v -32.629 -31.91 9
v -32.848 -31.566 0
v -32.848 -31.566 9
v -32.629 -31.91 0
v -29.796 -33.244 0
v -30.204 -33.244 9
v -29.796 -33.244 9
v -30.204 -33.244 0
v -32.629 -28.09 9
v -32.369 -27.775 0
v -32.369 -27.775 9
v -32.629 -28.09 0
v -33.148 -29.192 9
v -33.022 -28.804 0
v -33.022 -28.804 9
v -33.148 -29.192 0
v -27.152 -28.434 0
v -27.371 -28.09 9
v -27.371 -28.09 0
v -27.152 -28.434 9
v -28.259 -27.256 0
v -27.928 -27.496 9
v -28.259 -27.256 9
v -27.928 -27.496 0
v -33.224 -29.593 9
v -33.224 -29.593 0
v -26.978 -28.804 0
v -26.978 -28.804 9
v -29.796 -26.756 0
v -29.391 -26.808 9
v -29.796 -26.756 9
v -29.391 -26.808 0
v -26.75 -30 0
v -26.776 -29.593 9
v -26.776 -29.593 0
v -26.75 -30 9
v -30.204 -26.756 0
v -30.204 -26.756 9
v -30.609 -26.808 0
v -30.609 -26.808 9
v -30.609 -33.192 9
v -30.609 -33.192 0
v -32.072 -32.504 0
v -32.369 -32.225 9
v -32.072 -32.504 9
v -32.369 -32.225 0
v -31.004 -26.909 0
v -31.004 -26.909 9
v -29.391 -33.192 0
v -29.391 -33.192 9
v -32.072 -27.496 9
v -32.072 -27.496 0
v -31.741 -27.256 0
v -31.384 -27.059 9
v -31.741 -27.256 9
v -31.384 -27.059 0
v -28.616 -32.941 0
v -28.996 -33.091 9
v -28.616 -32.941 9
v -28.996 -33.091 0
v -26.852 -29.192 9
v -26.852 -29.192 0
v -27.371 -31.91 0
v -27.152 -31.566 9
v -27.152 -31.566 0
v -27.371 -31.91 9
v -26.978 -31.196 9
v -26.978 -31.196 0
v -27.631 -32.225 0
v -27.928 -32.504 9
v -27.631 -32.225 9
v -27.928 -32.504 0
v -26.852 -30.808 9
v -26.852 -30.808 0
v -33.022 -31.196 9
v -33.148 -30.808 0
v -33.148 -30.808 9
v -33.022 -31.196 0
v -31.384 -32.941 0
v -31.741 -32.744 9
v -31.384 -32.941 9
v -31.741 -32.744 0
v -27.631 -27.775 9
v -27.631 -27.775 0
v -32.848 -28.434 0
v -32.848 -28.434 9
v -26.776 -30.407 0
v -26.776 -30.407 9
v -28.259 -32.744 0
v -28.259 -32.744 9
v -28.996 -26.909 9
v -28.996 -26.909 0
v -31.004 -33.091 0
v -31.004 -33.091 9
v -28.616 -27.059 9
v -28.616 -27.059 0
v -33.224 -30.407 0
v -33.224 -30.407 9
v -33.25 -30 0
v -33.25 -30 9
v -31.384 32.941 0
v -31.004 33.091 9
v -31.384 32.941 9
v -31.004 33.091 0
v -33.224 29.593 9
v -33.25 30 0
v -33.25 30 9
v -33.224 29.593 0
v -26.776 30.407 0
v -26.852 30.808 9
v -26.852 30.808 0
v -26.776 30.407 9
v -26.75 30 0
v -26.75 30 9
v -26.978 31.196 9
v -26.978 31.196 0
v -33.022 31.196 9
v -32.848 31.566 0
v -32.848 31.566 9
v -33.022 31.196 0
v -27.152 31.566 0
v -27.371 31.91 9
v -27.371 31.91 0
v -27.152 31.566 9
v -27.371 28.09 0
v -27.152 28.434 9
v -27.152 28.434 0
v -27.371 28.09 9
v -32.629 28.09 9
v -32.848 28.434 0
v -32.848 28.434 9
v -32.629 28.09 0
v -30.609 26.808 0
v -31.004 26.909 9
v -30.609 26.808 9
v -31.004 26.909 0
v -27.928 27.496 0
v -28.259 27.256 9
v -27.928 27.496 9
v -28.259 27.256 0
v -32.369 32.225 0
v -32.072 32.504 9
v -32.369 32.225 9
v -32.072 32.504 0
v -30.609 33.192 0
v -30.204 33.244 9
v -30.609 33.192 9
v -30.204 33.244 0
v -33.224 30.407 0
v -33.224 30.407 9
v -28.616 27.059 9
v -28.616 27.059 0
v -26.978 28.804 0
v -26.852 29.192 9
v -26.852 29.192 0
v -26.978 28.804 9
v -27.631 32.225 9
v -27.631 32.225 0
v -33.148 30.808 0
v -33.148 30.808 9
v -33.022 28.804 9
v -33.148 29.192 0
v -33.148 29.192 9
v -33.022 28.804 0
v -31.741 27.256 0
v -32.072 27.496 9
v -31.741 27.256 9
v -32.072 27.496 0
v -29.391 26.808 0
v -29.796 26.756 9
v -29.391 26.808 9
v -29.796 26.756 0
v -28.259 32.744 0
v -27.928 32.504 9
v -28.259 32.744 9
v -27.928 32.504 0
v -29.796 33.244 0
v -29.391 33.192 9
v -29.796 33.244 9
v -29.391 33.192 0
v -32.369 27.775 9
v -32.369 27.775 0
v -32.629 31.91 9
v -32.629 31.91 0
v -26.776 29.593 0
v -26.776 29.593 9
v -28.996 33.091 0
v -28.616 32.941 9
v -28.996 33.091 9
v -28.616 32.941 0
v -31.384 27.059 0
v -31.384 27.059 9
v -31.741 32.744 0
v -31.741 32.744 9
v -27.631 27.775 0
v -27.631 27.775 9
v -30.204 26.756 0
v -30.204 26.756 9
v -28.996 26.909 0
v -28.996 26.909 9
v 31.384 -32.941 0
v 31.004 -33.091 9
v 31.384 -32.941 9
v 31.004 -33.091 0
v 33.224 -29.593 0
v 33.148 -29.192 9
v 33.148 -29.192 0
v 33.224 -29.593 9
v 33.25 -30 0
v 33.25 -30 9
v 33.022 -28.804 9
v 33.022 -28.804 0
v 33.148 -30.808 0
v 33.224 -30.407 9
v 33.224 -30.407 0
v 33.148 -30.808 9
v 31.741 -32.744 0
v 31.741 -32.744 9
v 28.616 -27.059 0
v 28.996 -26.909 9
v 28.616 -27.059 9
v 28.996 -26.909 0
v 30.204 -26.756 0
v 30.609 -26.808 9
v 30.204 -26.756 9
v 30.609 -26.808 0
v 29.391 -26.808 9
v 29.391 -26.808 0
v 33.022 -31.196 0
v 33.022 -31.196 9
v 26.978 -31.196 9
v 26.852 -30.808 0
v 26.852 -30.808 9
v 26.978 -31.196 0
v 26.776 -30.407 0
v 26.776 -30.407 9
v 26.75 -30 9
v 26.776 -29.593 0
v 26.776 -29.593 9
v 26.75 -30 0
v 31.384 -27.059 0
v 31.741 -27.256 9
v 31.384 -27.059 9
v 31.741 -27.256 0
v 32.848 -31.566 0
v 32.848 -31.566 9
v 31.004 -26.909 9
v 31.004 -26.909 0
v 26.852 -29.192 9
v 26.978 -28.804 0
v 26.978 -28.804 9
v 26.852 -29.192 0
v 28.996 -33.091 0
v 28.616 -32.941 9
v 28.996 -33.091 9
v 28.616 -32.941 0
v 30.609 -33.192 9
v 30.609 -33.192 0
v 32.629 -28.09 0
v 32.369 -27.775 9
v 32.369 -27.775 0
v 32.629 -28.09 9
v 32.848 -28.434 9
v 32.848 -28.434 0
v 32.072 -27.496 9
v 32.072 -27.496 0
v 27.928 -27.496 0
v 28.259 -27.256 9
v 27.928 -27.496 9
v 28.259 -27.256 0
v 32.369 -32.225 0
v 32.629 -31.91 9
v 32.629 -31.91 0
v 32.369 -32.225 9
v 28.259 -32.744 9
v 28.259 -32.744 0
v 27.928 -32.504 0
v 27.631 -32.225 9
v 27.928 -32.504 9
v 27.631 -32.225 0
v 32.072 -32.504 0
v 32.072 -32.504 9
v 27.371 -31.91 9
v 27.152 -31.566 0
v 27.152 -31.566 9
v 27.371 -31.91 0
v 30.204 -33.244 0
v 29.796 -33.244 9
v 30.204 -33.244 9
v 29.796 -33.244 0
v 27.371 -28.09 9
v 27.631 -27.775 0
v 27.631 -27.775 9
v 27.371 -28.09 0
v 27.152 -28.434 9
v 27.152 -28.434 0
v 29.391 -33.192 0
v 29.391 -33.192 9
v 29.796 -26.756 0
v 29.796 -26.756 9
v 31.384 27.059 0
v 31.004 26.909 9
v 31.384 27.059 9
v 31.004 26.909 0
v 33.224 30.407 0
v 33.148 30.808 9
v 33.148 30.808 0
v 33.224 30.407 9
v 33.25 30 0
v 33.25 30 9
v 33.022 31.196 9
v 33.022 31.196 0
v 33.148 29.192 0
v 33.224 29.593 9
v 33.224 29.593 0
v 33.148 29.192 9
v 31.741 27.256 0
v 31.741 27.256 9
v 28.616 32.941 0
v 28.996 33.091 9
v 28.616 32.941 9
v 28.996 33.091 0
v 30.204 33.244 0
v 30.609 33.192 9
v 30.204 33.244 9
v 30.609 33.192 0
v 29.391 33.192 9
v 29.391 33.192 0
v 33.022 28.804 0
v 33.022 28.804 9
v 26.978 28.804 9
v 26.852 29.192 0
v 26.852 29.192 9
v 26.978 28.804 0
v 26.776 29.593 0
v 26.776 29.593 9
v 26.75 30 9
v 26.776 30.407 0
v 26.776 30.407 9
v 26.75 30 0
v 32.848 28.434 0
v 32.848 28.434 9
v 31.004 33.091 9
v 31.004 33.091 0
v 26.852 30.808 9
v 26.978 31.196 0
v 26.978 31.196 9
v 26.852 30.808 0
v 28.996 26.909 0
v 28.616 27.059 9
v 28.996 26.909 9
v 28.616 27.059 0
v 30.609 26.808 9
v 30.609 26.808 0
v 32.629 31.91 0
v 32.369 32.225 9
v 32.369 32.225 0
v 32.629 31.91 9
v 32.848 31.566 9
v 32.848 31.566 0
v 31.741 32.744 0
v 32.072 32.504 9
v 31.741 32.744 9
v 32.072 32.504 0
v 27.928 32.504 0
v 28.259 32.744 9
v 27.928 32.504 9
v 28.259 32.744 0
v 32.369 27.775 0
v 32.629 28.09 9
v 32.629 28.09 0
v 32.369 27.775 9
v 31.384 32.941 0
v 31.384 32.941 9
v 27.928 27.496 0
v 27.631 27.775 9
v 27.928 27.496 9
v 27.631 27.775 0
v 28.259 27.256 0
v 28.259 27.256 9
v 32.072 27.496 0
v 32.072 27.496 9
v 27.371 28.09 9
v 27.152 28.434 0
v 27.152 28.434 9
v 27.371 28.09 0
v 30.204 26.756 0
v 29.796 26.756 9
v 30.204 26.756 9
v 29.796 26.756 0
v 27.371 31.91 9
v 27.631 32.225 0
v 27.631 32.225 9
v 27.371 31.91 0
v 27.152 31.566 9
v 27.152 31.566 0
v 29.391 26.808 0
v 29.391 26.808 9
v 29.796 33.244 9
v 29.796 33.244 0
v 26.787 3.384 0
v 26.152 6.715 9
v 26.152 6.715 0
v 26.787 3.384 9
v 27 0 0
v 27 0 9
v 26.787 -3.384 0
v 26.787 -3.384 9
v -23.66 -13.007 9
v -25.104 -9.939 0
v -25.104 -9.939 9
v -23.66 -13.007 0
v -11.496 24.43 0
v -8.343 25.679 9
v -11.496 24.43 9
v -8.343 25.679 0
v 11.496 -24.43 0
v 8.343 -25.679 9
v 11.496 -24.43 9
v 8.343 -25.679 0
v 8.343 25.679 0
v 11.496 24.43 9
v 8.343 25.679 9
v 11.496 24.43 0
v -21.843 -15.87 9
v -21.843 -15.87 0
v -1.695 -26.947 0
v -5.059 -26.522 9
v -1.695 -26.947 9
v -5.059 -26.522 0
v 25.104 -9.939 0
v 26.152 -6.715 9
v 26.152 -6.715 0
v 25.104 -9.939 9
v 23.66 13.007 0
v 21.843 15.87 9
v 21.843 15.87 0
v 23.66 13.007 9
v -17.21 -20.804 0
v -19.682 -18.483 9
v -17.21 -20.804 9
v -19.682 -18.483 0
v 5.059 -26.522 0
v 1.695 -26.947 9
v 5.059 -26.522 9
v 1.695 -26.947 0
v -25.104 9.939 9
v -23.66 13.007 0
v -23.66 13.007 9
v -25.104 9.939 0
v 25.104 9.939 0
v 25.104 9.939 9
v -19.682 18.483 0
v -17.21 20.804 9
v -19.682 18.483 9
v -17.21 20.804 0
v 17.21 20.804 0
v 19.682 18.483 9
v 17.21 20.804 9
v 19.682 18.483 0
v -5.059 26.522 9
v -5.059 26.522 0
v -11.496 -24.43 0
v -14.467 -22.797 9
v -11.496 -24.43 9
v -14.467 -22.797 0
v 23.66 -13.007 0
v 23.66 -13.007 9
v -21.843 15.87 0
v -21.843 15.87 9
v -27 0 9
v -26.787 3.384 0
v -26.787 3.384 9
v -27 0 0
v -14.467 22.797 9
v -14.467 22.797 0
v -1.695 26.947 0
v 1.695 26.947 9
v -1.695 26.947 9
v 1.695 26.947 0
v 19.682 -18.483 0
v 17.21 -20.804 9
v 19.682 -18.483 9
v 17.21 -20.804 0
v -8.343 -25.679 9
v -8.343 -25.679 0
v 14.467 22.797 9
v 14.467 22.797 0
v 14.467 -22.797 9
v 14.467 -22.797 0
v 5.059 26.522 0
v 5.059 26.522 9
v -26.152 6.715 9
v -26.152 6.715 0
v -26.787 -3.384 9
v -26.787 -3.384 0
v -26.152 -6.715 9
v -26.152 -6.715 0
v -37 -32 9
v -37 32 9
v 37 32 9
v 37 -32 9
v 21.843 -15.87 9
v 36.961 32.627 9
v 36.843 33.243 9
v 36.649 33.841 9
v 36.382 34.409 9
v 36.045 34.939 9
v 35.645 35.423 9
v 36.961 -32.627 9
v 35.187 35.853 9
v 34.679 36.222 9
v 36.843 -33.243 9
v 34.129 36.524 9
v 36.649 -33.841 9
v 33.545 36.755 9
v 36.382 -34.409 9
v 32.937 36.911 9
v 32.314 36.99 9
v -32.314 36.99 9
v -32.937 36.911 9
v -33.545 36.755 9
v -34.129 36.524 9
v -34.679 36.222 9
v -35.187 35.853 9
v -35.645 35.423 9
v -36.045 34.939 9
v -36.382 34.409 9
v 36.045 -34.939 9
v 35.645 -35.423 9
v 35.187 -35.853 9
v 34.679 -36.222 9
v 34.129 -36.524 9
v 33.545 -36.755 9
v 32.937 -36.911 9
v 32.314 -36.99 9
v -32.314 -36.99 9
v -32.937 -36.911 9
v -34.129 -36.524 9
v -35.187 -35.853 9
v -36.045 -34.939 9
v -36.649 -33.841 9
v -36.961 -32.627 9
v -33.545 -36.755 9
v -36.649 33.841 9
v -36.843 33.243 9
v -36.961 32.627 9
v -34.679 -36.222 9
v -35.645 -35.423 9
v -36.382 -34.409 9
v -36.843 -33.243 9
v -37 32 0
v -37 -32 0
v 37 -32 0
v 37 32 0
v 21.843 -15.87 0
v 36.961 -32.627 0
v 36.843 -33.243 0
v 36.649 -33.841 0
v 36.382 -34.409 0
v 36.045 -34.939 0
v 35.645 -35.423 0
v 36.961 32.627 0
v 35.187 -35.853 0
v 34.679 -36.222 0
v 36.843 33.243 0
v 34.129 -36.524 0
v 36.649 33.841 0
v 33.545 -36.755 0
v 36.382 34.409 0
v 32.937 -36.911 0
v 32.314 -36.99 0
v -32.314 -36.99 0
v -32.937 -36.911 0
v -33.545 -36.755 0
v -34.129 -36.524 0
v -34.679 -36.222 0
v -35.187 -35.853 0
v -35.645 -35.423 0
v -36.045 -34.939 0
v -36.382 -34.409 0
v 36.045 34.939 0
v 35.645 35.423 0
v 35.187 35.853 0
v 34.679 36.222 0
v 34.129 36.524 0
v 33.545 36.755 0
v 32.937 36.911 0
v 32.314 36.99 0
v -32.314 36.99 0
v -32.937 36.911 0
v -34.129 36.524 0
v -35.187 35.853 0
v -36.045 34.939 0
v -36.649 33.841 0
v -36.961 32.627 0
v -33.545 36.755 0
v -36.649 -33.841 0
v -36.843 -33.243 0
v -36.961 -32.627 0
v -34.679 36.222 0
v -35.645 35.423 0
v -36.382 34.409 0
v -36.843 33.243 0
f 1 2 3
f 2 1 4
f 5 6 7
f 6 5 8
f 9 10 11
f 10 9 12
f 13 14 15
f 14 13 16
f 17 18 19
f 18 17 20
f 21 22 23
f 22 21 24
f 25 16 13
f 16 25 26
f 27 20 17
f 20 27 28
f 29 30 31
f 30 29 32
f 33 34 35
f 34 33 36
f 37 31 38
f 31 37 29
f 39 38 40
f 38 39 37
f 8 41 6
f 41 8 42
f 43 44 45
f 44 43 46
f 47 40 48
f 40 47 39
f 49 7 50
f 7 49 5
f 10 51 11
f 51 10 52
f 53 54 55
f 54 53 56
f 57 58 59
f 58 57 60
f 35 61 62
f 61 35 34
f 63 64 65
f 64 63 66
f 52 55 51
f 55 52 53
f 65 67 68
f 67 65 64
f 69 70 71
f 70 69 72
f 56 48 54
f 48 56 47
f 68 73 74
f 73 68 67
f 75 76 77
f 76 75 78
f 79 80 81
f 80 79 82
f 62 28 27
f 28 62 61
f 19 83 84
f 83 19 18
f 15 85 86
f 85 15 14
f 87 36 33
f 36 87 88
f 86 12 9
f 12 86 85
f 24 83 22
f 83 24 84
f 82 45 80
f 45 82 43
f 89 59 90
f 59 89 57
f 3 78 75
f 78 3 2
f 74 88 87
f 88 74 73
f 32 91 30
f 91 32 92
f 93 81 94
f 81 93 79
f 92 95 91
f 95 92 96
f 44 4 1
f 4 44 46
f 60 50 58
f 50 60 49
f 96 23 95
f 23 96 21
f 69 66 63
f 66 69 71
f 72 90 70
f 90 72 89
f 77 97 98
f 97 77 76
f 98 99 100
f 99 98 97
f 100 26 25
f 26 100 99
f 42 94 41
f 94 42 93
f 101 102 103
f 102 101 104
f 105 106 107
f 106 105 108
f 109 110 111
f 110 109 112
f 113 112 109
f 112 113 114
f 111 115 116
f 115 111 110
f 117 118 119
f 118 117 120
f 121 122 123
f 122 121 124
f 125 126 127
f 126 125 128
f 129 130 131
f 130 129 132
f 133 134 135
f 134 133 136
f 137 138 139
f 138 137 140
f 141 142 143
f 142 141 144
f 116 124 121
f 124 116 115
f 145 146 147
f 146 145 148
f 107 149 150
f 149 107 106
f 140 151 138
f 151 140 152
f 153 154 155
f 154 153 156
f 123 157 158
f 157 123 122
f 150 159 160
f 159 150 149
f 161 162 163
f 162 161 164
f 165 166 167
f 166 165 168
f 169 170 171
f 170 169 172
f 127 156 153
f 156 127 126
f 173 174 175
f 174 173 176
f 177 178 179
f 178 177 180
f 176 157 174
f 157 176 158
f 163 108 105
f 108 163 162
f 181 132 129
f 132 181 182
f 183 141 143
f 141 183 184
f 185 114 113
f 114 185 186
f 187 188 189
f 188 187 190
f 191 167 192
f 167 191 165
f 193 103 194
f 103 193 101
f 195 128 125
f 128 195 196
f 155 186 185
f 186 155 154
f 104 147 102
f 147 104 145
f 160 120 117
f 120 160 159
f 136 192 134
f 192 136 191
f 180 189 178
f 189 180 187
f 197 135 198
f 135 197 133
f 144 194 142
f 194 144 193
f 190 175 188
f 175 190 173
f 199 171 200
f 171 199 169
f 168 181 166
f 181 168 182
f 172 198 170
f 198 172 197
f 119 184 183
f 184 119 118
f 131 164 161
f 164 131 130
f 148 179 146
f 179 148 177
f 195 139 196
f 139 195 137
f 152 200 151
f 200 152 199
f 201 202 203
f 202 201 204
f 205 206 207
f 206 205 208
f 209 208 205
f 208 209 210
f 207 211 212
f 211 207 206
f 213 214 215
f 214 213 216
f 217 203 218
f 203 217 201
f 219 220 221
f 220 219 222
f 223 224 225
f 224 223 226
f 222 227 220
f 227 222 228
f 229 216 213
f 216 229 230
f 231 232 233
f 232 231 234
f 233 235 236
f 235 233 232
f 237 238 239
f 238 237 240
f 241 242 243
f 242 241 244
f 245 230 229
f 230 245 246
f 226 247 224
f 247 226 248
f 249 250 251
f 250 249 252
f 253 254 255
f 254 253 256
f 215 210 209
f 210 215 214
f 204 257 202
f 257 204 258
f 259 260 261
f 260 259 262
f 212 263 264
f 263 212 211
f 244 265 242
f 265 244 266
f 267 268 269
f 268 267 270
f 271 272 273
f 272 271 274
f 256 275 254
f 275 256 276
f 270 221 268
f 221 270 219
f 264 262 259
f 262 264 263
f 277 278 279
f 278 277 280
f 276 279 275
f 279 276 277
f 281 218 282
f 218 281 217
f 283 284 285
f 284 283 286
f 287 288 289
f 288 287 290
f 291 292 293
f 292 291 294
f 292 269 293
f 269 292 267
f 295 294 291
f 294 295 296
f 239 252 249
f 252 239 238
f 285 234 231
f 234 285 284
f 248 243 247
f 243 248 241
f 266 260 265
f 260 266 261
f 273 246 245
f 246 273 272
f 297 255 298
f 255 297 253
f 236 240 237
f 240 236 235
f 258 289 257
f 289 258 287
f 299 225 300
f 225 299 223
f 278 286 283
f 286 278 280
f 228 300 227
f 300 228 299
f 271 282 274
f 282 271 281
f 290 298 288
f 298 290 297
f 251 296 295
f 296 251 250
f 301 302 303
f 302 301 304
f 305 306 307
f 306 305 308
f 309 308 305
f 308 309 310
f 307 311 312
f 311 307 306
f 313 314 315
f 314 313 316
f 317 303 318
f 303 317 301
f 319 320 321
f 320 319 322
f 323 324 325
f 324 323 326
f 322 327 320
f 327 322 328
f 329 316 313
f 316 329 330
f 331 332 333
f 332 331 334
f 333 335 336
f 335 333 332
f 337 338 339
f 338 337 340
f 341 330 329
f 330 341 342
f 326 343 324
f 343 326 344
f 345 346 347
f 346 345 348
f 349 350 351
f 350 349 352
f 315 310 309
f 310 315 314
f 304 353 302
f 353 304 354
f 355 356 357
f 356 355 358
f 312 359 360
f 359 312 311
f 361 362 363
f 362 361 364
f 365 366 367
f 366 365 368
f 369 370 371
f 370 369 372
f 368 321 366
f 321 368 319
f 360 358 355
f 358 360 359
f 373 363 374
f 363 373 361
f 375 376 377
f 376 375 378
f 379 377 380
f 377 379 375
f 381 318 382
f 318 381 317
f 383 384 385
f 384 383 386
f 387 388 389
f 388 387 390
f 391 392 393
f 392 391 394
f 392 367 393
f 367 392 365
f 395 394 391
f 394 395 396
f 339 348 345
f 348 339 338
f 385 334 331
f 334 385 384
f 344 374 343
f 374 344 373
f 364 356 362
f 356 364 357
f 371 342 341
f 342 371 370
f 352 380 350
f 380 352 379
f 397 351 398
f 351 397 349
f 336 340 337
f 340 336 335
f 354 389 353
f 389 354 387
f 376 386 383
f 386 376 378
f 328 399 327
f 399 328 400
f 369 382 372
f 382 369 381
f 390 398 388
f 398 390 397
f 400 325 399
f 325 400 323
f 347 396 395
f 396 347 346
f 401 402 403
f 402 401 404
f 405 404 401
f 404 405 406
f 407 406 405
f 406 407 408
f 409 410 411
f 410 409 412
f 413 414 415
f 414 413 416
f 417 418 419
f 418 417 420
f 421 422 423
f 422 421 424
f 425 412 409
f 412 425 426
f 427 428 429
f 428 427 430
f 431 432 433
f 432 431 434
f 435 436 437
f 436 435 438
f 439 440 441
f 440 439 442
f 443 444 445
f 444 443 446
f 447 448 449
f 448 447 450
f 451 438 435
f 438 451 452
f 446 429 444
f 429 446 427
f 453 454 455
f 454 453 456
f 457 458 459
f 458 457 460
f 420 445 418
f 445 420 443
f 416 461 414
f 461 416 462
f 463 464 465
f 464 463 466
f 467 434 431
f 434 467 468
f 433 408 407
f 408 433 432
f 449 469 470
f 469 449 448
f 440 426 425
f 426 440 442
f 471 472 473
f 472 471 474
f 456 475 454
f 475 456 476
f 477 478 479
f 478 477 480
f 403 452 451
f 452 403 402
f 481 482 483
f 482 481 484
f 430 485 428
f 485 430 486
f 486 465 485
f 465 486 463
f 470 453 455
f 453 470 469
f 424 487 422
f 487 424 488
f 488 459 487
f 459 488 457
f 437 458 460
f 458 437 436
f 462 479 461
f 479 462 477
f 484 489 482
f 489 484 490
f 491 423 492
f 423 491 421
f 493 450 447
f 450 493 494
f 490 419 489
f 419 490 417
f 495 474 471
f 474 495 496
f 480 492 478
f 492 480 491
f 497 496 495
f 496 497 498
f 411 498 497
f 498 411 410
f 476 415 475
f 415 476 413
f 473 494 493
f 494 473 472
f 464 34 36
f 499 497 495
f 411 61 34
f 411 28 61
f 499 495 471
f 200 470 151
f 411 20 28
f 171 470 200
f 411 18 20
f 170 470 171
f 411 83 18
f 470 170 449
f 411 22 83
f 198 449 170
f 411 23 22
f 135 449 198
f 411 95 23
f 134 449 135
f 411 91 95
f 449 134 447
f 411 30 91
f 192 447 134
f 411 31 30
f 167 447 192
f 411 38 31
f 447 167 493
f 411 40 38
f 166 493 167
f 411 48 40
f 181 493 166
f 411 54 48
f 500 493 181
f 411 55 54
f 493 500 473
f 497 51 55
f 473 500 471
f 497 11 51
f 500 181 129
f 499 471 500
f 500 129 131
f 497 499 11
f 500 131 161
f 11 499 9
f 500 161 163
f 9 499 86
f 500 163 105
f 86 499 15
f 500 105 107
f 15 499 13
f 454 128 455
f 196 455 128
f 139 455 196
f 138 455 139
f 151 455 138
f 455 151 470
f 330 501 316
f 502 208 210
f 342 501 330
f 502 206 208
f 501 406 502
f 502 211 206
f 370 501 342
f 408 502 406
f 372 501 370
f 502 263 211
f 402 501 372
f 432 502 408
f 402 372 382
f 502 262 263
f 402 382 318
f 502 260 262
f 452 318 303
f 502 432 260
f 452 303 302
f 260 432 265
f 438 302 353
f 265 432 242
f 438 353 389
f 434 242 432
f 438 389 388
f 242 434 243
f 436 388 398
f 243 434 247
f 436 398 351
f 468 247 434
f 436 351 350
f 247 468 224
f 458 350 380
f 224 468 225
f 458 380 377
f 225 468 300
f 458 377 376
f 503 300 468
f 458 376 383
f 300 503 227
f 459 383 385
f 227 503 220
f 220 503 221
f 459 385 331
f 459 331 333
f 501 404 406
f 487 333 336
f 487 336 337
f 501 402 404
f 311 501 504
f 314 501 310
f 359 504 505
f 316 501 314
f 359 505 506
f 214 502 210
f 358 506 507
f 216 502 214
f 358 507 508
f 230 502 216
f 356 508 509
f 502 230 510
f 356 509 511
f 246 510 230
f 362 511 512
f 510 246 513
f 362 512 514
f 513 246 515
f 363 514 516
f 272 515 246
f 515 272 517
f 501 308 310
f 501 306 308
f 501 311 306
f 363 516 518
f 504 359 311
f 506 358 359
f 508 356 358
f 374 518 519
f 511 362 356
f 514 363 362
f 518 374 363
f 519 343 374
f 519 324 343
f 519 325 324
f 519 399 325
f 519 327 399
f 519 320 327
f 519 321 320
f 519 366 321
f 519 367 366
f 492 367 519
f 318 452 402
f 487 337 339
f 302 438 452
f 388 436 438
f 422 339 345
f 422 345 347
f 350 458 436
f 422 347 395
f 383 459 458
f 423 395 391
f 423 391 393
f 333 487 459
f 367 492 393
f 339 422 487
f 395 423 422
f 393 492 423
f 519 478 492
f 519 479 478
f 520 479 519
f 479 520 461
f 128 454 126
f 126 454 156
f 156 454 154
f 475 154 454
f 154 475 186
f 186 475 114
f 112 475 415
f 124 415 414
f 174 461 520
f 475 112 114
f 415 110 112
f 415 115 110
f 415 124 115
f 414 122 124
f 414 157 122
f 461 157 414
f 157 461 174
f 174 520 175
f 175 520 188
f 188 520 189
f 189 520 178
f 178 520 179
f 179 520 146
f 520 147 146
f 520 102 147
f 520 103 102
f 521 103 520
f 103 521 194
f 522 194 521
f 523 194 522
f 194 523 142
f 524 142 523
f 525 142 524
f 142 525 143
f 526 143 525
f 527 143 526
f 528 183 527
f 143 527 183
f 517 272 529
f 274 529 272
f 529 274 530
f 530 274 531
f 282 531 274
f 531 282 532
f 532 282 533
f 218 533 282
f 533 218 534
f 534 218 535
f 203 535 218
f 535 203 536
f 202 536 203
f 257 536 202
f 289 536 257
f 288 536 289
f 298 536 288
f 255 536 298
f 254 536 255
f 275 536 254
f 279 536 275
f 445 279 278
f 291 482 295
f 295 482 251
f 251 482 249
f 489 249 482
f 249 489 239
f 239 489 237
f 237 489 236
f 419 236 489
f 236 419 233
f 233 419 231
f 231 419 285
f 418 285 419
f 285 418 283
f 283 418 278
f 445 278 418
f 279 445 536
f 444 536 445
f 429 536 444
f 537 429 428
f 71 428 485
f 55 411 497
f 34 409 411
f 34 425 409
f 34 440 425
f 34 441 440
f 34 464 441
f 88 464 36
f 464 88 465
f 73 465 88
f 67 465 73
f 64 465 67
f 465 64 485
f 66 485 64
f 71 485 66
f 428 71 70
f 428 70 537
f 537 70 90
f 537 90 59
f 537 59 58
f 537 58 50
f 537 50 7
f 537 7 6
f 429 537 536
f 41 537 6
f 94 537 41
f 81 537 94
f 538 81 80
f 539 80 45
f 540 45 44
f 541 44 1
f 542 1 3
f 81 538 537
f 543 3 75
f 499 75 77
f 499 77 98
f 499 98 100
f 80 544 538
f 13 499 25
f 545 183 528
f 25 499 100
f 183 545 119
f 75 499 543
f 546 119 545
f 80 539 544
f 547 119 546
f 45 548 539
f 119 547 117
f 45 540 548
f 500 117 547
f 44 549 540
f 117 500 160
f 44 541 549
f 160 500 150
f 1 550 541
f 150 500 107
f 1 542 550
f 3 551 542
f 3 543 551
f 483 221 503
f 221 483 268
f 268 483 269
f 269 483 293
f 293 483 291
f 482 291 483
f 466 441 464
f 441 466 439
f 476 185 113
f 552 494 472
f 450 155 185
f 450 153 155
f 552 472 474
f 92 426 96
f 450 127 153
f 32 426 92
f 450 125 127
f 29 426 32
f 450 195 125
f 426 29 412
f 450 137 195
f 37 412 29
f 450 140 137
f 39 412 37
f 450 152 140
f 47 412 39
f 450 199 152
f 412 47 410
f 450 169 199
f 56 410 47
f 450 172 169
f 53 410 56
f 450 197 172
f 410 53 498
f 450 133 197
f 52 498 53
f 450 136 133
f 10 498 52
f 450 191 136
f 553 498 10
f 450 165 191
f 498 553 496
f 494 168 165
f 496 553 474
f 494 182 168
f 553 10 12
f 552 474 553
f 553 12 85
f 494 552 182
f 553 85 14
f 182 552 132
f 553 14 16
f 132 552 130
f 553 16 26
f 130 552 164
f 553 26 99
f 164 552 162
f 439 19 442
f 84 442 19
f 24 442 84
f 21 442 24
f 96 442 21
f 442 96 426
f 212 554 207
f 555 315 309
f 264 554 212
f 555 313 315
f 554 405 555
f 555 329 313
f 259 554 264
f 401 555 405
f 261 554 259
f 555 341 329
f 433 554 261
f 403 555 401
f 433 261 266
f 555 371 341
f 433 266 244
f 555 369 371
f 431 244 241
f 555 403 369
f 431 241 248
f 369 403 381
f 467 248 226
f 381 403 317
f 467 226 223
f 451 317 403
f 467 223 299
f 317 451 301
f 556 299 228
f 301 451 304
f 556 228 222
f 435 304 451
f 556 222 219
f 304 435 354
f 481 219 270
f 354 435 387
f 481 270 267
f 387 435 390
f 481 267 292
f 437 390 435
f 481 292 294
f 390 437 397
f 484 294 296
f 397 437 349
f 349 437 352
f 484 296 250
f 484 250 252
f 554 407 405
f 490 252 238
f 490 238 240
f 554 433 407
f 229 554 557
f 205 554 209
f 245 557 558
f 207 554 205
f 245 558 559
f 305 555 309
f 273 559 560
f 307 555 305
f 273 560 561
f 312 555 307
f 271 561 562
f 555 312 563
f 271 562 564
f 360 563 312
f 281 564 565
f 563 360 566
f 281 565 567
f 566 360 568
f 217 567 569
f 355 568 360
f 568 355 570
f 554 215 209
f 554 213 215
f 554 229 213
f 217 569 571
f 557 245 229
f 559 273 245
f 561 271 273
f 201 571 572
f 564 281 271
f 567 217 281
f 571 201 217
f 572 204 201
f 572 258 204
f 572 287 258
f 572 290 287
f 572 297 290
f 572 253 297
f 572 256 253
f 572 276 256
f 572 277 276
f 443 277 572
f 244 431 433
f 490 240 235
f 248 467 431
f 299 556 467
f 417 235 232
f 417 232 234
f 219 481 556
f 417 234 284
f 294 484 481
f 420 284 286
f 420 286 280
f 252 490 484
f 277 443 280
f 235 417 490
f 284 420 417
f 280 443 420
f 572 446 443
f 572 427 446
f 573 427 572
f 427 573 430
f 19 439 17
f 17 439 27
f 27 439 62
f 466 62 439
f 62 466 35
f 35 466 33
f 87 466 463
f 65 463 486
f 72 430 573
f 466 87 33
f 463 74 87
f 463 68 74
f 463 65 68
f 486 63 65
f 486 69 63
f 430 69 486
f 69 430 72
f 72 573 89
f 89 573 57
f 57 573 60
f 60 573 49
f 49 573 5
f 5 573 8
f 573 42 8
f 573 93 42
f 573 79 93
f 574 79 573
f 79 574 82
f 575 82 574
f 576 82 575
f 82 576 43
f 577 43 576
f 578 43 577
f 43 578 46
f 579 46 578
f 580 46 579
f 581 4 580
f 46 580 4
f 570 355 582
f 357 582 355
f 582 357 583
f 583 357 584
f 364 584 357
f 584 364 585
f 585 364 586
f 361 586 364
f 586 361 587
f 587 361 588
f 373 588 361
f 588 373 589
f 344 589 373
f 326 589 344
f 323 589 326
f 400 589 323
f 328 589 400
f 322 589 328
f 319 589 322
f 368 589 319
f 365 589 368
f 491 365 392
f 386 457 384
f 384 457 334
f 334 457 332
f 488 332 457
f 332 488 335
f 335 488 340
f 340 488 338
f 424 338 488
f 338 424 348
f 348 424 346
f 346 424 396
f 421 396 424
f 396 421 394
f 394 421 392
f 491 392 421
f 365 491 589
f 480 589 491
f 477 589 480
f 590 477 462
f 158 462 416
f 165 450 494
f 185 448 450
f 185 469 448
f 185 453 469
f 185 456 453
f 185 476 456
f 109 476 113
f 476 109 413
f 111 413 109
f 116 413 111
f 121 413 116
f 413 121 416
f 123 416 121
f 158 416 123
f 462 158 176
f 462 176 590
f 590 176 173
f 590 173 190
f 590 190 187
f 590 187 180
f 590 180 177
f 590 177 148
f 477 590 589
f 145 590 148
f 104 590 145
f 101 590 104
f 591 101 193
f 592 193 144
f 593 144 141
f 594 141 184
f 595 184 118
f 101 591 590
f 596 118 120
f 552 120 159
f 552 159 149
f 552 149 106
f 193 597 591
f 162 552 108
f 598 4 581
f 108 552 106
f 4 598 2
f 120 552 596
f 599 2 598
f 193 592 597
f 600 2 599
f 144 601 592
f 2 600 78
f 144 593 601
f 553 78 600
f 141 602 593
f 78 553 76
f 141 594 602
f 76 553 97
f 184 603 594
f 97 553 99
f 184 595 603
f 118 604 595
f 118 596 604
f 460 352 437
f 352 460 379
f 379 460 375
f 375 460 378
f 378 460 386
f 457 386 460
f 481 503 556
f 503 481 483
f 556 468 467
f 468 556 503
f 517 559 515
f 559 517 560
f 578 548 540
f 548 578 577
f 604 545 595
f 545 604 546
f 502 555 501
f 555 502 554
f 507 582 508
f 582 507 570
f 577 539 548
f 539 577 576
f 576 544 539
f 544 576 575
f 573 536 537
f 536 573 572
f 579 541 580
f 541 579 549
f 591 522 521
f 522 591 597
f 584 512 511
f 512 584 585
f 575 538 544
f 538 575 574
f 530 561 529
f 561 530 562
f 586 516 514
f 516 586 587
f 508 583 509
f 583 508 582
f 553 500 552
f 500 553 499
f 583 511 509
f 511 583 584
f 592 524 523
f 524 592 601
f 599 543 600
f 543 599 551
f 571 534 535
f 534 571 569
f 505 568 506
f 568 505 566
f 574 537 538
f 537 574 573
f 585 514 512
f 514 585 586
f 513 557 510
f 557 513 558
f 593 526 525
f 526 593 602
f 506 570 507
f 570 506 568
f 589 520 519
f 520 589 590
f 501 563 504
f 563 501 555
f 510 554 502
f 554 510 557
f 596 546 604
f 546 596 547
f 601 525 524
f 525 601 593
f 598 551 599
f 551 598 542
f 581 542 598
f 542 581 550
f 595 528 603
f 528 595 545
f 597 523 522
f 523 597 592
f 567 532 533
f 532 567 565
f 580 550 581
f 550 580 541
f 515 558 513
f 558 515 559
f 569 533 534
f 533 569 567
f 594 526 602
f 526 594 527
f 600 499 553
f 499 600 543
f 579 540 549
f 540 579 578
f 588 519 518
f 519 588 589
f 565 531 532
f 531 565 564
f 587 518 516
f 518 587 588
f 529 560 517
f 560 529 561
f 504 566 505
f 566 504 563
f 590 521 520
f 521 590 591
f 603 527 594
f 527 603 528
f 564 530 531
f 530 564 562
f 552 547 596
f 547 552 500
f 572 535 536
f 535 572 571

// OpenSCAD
$fn = 50;


difference() {
	union() {
		hull() {
			translate(v = [-32.0000000000, 32.0000000000, 0]) {
				cylinder(h = 9, r = 5);
			}
			translate(v = [32.0000000000, 32.0000000000, 0]) {
				cylinder(h = 9, r = 5);
			}
			translate(v = [-32.0000000000, -32.0000000000, 0]) {
				cylinder(h = 9, r = 5);
			}
			translate(v = [32.0000000000, -32.0000000000, 0]) {
				cylinder(h = 9, r = 5);
			}
		}
	}
	union() {
		#translate(v = [-30.0000000000, -30.0000000000, -100.0000000000]) {
			cylinder(h = 200, r = 3.2500000000);
		}
		#translate(v = [-30.0000000000, 30.0000000000, -100.0000000000]) {
			cylinder(h = 200, r = 3.2500000000);
		}
		#translate(v = [30.0000000000, -30.0000000000, -100.0000000000]) {
			cylinder(h = 200, r = 3.2500000000);
		}
		#translate(v = [30.0000000000, 30.0000000000, -100.0000000000]) {
			cylinder(h = 200, r = 3.2500000000);
		}
		#cylinder(h = 9, r = 27.0000000000);
	}
}
